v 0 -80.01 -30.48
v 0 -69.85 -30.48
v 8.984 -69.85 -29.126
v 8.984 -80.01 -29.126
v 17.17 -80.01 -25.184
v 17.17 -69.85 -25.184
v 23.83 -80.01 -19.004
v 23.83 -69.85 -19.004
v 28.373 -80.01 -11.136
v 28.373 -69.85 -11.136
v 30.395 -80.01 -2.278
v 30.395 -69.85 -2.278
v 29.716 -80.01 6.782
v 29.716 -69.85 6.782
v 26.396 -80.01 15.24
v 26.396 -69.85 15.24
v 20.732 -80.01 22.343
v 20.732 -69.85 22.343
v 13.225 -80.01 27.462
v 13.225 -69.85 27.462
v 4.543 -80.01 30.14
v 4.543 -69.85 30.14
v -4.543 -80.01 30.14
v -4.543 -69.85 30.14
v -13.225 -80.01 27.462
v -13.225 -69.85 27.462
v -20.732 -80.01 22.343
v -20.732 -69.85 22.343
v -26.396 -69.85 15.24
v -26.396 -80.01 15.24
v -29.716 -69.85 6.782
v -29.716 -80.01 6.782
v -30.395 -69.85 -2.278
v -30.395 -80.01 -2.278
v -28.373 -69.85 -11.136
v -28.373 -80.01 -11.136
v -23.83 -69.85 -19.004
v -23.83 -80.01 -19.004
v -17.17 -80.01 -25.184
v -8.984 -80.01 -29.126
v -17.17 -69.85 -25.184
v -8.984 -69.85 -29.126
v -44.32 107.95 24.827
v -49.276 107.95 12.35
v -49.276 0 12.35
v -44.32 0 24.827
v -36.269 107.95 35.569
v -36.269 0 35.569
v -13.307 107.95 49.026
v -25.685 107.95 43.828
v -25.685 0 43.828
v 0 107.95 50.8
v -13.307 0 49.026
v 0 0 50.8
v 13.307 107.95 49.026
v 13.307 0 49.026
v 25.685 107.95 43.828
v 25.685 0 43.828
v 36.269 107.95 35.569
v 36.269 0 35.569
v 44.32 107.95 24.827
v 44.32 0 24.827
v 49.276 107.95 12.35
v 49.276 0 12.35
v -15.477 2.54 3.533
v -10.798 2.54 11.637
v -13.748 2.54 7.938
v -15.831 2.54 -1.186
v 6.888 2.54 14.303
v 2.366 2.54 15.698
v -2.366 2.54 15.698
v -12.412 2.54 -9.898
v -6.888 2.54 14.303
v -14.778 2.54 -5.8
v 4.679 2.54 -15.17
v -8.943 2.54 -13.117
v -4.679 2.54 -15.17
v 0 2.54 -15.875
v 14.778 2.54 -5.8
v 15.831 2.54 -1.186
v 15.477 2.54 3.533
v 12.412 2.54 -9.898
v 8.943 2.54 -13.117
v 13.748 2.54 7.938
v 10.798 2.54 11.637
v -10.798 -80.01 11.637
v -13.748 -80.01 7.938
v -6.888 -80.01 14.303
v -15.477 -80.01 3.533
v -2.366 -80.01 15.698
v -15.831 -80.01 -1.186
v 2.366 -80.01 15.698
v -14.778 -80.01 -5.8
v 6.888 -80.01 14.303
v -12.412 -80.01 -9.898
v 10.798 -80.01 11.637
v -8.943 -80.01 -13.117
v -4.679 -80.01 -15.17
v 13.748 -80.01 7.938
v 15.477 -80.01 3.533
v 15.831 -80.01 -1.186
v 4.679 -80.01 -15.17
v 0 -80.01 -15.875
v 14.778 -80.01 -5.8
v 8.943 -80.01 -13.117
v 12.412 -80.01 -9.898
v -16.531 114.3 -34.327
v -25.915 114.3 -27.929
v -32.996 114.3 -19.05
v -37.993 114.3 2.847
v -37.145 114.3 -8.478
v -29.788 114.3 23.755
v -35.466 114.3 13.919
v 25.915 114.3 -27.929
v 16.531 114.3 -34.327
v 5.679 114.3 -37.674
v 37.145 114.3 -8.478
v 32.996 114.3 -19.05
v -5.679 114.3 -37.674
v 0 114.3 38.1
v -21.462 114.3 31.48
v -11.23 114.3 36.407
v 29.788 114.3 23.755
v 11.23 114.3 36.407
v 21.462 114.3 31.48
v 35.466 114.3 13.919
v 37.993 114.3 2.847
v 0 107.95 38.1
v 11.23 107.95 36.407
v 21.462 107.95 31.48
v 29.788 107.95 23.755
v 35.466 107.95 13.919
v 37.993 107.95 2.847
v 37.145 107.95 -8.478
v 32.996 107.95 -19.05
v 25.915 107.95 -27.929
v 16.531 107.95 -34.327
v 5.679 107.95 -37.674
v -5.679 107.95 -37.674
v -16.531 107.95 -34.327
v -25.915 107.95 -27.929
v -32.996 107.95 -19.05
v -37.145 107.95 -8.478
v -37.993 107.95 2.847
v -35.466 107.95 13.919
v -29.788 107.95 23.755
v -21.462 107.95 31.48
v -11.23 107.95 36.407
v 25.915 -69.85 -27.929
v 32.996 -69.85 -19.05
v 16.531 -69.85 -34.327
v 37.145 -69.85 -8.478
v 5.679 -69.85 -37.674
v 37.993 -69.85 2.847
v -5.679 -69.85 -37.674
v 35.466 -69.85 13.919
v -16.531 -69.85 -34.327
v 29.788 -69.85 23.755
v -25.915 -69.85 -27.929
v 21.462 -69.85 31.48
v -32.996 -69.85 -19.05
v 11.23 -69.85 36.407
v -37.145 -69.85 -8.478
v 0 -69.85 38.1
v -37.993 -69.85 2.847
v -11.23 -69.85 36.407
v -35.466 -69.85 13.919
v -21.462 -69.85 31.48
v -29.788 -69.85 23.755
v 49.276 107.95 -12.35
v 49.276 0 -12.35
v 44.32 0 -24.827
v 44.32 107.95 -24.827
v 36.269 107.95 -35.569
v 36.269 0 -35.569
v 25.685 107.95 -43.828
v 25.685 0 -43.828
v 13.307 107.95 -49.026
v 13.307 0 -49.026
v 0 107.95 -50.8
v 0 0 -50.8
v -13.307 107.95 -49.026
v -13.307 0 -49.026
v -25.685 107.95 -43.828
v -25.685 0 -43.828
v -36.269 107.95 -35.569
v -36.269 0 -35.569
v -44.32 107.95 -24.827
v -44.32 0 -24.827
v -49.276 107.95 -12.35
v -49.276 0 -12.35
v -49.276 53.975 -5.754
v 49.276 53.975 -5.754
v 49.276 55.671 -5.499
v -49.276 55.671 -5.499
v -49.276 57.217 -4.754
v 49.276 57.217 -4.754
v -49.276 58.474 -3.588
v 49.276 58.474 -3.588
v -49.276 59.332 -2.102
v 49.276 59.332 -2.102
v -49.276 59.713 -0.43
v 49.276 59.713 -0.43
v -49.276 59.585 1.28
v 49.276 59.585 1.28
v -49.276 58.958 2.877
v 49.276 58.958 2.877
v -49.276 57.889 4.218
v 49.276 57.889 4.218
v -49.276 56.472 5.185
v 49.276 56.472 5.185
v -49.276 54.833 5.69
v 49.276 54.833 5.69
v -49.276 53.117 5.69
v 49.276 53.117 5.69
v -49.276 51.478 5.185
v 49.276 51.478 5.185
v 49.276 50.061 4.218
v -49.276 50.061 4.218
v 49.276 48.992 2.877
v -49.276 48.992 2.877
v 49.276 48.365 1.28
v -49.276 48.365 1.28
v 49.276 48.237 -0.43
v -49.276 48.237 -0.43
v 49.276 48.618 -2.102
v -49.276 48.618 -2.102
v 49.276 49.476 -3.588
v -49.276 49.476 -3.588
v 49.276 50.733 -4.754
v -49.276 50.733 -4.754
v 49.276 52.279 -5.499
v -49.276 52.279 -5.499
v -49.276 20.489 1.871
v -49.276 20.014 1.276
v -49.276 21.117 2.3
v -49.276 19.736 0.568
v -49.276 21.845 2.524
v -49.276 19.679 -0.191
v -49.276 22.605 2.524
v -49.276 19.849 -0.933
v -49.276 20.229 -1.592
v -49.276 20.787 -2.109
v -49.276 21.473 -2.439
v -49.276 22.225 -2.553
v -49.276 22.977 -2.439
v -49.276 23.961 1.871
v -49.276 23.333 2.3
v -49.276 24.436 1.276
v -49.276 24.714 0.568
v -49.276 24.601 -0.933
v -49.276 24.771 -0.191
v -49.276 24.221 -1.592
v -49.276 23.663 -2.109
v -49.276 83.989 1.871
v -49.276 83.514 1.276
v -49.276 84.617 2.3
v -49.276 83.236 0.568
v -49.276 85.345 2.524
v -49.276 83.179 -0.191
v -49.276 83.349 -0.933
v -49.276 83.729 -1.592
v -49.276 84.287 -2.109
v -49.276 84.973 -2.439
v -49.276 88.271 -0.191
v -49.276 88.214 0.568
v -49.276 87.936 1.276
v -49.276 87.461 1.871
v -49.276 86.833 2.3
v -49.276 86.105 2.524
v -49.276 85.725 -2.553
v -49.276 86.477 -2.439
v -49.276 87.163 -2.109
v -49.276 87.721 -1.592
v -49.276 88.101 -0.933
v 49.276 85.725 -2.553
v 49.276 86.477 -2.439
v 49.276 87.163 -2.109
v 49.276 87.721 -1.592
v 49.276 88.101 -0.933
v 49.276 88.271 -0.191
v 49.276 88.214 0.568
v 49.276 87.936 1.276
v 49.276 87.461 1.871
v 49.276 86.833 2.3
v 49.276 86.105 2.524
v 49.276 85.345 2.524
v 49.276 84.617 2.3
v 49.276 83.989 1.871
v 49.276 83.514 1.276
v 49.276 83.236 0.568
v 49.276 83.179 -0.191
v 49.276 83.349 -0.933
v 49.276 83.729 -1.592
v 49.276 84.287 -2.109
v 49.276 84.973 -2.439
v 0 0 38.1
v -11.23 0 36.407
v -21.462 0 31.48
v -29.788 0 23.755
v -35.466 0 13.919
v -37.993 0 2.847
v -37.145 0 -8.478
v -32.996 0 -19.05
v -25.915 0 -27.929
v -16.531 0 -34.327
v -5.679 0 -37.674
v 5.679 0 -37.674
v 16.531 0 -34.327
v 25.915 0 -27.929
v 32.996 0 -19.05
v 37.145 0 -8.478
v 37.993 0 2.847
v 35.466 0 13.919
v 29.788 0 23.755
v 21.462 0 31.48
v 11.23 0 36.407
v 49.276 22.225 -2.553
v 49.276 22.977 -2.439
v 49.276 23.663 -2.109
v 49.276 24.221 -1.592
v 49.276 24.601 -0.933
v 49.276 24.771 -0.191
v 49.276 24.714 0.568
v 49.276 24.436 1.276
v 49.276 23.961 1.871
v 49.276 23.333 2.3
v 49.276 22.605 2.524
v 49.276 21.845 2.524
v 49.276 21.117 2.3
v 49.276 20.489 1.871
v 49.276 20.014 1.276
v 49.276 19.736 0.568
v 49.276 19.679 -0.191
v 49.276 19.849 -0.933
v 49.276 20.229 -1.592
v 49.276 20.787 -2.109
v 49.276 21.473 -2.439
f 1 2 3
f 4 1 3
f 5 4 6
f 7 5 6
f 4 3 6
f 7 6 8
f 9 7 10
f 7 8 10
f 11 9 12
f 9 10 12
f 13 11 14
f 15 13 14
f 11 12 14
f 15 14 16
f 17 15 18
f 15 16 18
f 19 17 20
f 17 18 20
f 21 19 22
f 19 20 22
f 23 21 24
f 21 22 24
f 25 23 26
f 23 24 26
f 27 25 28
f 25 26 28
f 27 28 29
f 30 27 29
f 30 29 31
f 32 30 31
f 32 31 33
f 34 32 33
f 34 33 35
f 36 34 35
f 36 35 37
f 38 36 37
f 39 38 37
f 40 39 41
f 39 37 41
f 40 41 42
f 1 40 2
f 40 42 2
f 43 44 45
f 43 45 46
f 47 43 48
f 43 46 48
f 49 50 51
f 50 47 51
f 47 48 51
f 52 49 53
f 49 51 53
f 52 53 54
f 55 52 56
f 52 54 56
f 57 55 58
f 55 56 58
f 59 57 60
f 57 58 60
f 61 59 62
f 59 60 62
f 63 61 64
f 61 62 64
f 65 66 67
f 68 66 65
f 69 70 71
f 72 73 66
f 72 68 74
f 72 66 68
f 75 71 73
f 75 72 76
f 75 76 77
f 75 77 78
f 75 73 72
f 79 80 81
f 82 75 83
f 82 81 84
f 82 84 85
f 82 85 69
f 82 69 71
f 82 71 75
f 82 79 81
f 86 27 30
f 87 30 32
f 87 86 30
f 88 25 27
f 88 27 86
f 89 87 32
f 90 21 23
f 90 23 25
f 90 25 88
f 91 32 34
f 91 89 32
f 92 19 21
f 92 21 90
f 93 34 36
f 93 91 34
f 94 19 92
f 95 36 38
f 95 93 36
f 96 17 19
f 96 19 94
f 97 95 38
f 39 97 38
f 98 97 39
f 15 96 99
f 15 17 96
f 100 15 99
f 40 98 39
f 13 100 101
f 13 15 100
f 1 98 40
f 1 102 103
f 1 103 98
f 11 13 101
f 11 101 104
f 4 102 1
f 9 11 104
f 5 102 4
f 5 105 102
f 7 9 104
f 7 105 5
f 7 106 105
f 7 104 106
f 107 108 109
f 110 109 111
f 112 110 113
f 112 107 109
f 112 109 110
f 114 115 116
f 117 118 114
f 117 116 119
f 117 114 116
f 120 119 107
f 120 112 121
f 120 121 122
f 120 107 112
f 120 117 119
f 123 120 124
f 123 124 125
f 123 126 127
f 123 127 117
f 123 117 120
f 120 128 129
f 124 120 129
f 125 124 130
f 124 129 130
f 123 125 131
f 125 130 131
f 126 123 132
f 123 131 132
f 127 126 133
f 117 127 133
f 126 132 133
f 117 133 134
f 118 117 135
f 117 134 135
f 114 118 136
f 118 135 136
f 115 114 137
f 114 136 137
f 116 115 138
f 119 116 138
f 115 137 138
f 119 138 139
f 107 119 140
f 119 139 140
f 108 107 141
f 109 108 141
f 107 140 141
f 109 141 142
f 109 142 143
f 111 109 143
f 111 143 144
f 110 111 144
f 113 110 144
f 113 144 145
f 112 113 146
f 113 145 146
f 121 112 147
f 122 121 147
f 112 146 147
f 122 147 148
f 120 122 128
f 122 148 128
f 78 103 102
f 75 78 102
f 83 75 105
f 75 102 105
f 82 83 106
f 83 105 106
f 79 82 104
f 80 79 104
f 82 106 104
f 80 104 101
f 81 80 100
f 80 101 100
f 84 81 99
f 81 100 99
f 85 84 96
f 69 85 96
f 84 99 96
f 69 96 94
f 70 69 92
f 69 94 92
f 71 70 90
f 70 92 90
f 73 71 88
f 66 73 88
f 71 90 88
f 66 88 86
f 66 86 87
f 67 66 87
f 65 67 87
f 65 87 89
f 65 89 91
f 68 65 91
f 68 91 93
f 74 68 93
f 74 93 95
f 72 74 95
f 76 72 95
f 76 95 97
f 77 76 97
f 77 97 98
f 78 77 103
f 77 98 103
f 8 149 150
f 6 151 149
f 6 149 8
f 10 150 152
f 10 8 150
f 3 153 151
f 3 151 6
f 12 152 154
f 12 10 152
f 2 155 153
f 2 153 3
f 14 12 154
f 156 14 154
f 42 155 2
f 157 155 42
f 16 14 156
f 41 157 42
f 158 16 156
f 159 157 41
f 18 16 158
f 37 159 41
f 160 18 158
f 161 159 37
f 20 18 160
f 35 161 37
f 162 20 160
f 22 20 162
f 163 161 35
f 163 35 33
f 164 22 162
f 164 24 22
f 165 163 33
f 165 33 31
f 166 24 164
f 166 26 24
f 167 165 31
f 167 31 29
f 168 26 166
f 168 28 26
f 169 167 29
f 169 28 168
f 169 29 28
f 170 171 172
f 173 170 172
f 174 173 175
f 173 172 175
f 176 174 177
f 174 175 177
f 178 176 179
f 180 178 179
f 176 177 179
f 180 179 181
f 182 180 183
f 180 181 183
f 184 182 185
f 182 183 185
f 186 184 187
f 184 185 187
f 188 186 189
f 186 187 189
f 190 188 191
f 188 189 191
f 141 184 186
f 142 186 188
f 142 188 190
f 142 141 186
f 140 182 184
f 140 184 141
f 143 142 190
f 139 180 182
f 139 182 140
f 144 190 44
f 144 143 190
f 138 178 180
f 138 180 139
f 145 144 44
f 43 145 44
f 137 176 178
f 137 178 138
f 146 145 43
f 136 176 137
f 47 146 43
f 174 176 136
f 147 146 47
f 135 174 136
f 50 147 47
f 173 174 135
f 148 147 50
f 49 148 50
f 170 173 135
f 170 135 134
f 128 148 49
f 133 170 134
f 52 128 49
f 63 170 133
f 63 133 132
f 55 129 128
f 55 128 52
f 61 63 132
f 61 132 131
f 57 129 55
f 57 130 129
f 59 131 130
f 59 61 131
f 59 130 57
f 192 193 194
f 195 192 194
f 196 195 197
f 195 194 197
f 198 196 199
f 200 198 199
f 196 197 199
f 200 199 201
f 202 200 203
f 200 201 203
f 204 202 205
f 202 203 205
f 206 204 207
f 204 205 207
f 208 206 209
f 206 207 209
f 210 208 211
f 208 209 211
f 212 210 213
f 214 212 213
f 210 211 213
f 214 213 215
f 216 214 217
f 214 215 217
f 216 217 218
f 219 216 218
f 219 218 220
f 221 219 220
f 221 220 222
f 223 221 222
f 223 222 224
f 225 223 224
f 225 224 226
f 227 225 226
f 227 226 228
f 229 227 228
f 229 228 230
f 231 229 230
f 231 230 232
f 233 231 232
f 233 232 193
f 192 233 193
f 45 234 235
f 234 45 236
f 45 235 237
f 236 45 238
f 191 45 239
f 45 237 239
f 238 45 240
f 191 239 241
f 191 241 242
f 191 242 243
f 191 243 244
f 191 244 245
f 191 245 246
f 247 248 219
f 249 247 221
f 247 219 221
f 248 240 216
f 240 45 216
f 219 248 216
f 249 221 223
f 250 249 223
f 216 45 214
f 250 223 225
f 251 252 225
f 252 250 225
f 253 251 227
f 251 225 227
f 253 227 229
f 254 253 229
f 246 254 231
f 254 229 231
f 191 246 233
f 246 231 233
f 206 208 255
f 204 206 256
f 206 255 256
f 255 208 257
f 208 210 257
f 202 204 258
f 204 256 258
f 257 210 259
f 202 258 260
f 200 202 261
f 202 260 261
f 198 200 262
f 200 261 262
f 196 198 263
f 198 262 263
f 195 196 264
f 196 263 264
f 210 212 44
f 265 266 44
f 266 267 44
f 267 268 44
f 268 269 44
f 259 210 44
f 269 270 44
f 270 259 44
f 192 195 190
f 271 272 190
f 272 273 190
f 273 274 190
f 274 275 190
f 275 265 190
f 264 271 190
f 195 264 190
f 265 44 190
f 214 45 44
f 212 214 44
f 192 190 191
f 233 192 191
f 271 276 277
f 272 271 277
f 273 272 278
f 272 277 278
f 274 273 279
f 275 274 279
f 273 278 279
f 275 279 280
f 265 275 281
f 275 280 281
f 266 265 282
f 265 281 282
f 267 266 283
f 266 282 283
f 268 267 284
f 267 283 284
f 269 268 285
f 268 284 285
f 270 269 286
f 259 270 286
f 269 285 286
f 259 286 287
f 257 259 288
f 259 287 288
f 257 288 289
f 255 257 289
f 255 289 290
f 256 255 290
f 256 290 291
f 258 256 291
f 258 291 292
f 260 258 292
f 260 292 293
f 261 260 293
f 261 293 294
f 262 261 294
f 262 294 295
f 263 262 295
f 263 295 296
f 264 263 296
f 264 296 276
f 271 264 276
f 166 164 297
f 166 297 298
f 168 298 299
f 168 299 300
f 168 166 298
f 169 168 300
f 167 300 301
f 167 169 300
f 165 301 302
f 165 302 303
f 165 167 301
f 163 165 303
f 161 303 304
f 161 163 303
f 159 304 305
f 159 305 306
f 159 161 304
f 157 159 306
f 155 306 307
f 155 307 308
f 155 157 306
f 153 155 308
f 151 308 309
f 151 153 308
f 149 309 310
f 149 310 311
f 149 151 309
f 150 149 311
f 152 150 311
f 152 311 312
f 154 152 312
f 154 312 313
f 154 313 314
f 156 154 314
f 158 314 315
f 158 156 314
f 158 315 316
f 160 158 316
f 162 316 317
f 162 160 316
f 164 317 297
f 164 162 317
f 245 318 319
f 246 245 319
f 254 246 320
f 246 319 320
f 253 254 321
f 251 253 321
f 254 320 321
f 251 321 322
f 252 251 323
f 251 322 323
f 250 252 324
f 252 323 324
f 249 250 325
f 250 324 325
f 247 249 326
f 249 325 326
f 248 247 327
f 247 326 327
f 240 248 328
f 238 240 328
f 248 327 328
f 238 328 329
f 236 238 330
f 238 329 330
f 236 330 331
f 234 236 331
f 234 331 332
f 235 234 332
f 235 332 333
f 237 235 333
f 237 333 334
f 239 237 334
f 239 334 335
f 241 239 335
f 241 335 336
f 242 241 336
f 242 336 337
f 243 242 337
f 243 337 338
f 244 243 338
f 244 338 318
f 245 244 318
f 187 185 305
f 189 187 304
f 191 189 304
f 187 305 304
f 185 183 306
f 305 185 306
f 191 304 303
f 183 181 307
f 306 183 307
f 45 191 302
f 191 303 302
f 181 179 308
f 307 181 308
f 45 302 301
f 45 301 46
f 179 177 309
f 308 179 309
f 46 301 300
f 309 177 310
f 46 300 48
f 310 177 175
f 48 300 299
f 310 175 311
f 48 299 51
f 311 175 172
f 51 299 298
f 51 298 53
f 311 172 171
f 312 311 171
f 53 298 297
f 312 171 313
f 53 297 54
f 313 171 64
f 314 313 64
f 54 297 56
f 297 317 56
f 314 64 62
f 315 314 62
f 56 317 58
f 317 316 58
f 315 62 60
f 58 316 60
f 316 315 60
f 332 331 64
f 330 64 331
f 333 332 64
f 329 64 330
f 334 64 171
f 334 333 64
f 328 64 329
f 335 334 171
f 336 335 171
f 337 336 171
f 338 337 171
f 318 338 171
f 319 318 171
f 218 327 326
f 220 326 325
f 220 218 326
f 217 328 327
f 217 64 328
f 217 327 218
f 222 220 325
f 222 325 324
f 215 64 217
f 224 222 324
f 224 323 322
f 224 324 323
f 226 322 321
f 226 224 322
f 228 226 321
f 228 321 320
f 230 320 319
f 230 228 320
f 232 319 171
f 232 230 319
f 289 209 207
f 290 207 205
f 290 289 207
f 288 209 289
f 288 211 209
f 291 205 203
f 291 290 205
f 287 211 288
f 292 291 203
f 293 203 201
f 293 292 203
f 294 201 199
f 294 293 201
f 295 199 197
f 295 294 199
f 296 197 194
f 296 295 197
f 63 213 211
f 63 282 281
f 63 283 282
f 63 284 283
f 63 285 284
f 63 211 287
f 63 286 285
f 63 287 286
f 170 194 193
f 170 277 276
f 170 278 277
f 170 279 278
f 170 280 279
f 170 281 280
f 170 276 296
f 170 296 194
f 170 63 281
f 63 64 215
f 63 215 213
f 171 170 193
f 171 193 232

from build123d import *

# Parameters (mm, degrees)
SKETCH1_R               = 50.8
BOSS_EXTRUDE1_DEPTH     = 107.95
SKETCH2_R               = 38.1
BOSS_EXTRUDE2_DEPTH     = 6.35
BOSS_EXTRUDE3_START     = 69.85
SKETCH3_R               = 38.1
BOSS_EXTRUDE3_DEPTH     = 69.85
SKETCH4_R               = 30.48
BOSS_EXTRUDE4_DEPTH     = 10.16
SKETCH5_R               = 15.875
CUT_EXTRUDE1_DEPTH      = 82.55
SKETCH7_OUTSIDE_W       = 151.932
SKETCH7_OUTSIDE_H       = 151.932
SKETCH7_OUTSIDE_W_2     = 98.552
SKETCH7_OUTSIDE_H_2     = 127
CUT_EXTRUDE2_DEPTH      = 107.95
F_1_2_20_TAPPED_HOLE1_D = 11.50874
F_1_4_20_TAPPED_HOLE1_D = 5.1054


with BuildPart() as part:
    # Sketch1 → Boss-Extrude1 (new body)
    with BuildSketch(Plane(origin=(0, 0, 0), x_dir=(1, 0, 0), z_dir=(0, 1, 0))):
        with Locations(Location((0, 0, 0), (0, 0, 270))):
            Circle(SKETCH1_R)
    extrude(amount=BOSS_EXTRUDE1_DEPTH)

    # Sketch2 → Boss-Extrude2 (add)
    with BuildSketch(Plane(origin=(0, 107.95, 0), x_dir=(1, 0, 0), z_dir=(0, 1, 0))):
        with Locations(Location((0, 0, 0), (0, 0, 270))):
            Circle(SKETCH2_R)
    extrude(amount=BOSS_EXTRUDE2_DEPTH)

    # Sketch3 → Boss-Extrude3 (add)
    with BuildSketch(Plane.XZ.offset(BOSS_EXTRUDE3_START)):
        with Locations(Location((0, 0, 0), (0, 0, 90))):
            Circle(SKETCH3_R)
    extrude(amount=-BOSS_EXTRUDE3_DEPTH)

    # Sketch4 → Boss-Extrude4 (add)
    with BuildSketch(Plane.XZ.offset(69.85)):
        with Locations(Location((0, 0, 0), (0, 0, 270))):
            Circle(SKETCH4_R)
    extrude(amount=BOSS_EXTRUDE4_DEPTH)

    # Sketch5 → Cut-Extrude1 (cut)
    with BuildSketch(Plane.XZ.offset(80.01)):
        with Locations(Location((0, 0, 0), (0, 0, 270))):
            Circle(SKETCH5_R)
    extrude(amount=-CUT_EXTRUDE1_DEPTH, mode=Mode.SUBTRACT)

    # Sketch7 outside → Cut-Extrude2 (cut)
    with BuildSketch(Plane(origin=(0, 107.95, 0), x_dir=(1, 0, 0), z_dir=(0, 1, 0))):
        Rectangle(SKETCH7_OUTSIDE_W, SKETCH7_OUTSIDE_H)
        Rectangle(SKETCH7_OUTSIDE_W_2, SKETCH7_OUTSIDE_H_2, mode=Mode.SUBTRACT)
    extrude(amount=-CUT_EXTRUDE2_DEPTH, mode=Mode.SUBTRACT)

    # 1/2-20 Tapped Hole1 (through all)
    with Locations(Plane.ZY.offset(49.276)):
        with Locations((0, 53.975)):
            Hole(F_1_2_20_TAPPED_HOLE1_D / 2)

    # 1/4-20 Tapped Hole1 (through all)
    with Locations(Plane.ZY.offset(49.276)):
        with Locations((0, 85.725), (0, 22.225)):
            Hole(F_1_4_20_TAPPED_HOLE1_D / 2)


solid = part.part
